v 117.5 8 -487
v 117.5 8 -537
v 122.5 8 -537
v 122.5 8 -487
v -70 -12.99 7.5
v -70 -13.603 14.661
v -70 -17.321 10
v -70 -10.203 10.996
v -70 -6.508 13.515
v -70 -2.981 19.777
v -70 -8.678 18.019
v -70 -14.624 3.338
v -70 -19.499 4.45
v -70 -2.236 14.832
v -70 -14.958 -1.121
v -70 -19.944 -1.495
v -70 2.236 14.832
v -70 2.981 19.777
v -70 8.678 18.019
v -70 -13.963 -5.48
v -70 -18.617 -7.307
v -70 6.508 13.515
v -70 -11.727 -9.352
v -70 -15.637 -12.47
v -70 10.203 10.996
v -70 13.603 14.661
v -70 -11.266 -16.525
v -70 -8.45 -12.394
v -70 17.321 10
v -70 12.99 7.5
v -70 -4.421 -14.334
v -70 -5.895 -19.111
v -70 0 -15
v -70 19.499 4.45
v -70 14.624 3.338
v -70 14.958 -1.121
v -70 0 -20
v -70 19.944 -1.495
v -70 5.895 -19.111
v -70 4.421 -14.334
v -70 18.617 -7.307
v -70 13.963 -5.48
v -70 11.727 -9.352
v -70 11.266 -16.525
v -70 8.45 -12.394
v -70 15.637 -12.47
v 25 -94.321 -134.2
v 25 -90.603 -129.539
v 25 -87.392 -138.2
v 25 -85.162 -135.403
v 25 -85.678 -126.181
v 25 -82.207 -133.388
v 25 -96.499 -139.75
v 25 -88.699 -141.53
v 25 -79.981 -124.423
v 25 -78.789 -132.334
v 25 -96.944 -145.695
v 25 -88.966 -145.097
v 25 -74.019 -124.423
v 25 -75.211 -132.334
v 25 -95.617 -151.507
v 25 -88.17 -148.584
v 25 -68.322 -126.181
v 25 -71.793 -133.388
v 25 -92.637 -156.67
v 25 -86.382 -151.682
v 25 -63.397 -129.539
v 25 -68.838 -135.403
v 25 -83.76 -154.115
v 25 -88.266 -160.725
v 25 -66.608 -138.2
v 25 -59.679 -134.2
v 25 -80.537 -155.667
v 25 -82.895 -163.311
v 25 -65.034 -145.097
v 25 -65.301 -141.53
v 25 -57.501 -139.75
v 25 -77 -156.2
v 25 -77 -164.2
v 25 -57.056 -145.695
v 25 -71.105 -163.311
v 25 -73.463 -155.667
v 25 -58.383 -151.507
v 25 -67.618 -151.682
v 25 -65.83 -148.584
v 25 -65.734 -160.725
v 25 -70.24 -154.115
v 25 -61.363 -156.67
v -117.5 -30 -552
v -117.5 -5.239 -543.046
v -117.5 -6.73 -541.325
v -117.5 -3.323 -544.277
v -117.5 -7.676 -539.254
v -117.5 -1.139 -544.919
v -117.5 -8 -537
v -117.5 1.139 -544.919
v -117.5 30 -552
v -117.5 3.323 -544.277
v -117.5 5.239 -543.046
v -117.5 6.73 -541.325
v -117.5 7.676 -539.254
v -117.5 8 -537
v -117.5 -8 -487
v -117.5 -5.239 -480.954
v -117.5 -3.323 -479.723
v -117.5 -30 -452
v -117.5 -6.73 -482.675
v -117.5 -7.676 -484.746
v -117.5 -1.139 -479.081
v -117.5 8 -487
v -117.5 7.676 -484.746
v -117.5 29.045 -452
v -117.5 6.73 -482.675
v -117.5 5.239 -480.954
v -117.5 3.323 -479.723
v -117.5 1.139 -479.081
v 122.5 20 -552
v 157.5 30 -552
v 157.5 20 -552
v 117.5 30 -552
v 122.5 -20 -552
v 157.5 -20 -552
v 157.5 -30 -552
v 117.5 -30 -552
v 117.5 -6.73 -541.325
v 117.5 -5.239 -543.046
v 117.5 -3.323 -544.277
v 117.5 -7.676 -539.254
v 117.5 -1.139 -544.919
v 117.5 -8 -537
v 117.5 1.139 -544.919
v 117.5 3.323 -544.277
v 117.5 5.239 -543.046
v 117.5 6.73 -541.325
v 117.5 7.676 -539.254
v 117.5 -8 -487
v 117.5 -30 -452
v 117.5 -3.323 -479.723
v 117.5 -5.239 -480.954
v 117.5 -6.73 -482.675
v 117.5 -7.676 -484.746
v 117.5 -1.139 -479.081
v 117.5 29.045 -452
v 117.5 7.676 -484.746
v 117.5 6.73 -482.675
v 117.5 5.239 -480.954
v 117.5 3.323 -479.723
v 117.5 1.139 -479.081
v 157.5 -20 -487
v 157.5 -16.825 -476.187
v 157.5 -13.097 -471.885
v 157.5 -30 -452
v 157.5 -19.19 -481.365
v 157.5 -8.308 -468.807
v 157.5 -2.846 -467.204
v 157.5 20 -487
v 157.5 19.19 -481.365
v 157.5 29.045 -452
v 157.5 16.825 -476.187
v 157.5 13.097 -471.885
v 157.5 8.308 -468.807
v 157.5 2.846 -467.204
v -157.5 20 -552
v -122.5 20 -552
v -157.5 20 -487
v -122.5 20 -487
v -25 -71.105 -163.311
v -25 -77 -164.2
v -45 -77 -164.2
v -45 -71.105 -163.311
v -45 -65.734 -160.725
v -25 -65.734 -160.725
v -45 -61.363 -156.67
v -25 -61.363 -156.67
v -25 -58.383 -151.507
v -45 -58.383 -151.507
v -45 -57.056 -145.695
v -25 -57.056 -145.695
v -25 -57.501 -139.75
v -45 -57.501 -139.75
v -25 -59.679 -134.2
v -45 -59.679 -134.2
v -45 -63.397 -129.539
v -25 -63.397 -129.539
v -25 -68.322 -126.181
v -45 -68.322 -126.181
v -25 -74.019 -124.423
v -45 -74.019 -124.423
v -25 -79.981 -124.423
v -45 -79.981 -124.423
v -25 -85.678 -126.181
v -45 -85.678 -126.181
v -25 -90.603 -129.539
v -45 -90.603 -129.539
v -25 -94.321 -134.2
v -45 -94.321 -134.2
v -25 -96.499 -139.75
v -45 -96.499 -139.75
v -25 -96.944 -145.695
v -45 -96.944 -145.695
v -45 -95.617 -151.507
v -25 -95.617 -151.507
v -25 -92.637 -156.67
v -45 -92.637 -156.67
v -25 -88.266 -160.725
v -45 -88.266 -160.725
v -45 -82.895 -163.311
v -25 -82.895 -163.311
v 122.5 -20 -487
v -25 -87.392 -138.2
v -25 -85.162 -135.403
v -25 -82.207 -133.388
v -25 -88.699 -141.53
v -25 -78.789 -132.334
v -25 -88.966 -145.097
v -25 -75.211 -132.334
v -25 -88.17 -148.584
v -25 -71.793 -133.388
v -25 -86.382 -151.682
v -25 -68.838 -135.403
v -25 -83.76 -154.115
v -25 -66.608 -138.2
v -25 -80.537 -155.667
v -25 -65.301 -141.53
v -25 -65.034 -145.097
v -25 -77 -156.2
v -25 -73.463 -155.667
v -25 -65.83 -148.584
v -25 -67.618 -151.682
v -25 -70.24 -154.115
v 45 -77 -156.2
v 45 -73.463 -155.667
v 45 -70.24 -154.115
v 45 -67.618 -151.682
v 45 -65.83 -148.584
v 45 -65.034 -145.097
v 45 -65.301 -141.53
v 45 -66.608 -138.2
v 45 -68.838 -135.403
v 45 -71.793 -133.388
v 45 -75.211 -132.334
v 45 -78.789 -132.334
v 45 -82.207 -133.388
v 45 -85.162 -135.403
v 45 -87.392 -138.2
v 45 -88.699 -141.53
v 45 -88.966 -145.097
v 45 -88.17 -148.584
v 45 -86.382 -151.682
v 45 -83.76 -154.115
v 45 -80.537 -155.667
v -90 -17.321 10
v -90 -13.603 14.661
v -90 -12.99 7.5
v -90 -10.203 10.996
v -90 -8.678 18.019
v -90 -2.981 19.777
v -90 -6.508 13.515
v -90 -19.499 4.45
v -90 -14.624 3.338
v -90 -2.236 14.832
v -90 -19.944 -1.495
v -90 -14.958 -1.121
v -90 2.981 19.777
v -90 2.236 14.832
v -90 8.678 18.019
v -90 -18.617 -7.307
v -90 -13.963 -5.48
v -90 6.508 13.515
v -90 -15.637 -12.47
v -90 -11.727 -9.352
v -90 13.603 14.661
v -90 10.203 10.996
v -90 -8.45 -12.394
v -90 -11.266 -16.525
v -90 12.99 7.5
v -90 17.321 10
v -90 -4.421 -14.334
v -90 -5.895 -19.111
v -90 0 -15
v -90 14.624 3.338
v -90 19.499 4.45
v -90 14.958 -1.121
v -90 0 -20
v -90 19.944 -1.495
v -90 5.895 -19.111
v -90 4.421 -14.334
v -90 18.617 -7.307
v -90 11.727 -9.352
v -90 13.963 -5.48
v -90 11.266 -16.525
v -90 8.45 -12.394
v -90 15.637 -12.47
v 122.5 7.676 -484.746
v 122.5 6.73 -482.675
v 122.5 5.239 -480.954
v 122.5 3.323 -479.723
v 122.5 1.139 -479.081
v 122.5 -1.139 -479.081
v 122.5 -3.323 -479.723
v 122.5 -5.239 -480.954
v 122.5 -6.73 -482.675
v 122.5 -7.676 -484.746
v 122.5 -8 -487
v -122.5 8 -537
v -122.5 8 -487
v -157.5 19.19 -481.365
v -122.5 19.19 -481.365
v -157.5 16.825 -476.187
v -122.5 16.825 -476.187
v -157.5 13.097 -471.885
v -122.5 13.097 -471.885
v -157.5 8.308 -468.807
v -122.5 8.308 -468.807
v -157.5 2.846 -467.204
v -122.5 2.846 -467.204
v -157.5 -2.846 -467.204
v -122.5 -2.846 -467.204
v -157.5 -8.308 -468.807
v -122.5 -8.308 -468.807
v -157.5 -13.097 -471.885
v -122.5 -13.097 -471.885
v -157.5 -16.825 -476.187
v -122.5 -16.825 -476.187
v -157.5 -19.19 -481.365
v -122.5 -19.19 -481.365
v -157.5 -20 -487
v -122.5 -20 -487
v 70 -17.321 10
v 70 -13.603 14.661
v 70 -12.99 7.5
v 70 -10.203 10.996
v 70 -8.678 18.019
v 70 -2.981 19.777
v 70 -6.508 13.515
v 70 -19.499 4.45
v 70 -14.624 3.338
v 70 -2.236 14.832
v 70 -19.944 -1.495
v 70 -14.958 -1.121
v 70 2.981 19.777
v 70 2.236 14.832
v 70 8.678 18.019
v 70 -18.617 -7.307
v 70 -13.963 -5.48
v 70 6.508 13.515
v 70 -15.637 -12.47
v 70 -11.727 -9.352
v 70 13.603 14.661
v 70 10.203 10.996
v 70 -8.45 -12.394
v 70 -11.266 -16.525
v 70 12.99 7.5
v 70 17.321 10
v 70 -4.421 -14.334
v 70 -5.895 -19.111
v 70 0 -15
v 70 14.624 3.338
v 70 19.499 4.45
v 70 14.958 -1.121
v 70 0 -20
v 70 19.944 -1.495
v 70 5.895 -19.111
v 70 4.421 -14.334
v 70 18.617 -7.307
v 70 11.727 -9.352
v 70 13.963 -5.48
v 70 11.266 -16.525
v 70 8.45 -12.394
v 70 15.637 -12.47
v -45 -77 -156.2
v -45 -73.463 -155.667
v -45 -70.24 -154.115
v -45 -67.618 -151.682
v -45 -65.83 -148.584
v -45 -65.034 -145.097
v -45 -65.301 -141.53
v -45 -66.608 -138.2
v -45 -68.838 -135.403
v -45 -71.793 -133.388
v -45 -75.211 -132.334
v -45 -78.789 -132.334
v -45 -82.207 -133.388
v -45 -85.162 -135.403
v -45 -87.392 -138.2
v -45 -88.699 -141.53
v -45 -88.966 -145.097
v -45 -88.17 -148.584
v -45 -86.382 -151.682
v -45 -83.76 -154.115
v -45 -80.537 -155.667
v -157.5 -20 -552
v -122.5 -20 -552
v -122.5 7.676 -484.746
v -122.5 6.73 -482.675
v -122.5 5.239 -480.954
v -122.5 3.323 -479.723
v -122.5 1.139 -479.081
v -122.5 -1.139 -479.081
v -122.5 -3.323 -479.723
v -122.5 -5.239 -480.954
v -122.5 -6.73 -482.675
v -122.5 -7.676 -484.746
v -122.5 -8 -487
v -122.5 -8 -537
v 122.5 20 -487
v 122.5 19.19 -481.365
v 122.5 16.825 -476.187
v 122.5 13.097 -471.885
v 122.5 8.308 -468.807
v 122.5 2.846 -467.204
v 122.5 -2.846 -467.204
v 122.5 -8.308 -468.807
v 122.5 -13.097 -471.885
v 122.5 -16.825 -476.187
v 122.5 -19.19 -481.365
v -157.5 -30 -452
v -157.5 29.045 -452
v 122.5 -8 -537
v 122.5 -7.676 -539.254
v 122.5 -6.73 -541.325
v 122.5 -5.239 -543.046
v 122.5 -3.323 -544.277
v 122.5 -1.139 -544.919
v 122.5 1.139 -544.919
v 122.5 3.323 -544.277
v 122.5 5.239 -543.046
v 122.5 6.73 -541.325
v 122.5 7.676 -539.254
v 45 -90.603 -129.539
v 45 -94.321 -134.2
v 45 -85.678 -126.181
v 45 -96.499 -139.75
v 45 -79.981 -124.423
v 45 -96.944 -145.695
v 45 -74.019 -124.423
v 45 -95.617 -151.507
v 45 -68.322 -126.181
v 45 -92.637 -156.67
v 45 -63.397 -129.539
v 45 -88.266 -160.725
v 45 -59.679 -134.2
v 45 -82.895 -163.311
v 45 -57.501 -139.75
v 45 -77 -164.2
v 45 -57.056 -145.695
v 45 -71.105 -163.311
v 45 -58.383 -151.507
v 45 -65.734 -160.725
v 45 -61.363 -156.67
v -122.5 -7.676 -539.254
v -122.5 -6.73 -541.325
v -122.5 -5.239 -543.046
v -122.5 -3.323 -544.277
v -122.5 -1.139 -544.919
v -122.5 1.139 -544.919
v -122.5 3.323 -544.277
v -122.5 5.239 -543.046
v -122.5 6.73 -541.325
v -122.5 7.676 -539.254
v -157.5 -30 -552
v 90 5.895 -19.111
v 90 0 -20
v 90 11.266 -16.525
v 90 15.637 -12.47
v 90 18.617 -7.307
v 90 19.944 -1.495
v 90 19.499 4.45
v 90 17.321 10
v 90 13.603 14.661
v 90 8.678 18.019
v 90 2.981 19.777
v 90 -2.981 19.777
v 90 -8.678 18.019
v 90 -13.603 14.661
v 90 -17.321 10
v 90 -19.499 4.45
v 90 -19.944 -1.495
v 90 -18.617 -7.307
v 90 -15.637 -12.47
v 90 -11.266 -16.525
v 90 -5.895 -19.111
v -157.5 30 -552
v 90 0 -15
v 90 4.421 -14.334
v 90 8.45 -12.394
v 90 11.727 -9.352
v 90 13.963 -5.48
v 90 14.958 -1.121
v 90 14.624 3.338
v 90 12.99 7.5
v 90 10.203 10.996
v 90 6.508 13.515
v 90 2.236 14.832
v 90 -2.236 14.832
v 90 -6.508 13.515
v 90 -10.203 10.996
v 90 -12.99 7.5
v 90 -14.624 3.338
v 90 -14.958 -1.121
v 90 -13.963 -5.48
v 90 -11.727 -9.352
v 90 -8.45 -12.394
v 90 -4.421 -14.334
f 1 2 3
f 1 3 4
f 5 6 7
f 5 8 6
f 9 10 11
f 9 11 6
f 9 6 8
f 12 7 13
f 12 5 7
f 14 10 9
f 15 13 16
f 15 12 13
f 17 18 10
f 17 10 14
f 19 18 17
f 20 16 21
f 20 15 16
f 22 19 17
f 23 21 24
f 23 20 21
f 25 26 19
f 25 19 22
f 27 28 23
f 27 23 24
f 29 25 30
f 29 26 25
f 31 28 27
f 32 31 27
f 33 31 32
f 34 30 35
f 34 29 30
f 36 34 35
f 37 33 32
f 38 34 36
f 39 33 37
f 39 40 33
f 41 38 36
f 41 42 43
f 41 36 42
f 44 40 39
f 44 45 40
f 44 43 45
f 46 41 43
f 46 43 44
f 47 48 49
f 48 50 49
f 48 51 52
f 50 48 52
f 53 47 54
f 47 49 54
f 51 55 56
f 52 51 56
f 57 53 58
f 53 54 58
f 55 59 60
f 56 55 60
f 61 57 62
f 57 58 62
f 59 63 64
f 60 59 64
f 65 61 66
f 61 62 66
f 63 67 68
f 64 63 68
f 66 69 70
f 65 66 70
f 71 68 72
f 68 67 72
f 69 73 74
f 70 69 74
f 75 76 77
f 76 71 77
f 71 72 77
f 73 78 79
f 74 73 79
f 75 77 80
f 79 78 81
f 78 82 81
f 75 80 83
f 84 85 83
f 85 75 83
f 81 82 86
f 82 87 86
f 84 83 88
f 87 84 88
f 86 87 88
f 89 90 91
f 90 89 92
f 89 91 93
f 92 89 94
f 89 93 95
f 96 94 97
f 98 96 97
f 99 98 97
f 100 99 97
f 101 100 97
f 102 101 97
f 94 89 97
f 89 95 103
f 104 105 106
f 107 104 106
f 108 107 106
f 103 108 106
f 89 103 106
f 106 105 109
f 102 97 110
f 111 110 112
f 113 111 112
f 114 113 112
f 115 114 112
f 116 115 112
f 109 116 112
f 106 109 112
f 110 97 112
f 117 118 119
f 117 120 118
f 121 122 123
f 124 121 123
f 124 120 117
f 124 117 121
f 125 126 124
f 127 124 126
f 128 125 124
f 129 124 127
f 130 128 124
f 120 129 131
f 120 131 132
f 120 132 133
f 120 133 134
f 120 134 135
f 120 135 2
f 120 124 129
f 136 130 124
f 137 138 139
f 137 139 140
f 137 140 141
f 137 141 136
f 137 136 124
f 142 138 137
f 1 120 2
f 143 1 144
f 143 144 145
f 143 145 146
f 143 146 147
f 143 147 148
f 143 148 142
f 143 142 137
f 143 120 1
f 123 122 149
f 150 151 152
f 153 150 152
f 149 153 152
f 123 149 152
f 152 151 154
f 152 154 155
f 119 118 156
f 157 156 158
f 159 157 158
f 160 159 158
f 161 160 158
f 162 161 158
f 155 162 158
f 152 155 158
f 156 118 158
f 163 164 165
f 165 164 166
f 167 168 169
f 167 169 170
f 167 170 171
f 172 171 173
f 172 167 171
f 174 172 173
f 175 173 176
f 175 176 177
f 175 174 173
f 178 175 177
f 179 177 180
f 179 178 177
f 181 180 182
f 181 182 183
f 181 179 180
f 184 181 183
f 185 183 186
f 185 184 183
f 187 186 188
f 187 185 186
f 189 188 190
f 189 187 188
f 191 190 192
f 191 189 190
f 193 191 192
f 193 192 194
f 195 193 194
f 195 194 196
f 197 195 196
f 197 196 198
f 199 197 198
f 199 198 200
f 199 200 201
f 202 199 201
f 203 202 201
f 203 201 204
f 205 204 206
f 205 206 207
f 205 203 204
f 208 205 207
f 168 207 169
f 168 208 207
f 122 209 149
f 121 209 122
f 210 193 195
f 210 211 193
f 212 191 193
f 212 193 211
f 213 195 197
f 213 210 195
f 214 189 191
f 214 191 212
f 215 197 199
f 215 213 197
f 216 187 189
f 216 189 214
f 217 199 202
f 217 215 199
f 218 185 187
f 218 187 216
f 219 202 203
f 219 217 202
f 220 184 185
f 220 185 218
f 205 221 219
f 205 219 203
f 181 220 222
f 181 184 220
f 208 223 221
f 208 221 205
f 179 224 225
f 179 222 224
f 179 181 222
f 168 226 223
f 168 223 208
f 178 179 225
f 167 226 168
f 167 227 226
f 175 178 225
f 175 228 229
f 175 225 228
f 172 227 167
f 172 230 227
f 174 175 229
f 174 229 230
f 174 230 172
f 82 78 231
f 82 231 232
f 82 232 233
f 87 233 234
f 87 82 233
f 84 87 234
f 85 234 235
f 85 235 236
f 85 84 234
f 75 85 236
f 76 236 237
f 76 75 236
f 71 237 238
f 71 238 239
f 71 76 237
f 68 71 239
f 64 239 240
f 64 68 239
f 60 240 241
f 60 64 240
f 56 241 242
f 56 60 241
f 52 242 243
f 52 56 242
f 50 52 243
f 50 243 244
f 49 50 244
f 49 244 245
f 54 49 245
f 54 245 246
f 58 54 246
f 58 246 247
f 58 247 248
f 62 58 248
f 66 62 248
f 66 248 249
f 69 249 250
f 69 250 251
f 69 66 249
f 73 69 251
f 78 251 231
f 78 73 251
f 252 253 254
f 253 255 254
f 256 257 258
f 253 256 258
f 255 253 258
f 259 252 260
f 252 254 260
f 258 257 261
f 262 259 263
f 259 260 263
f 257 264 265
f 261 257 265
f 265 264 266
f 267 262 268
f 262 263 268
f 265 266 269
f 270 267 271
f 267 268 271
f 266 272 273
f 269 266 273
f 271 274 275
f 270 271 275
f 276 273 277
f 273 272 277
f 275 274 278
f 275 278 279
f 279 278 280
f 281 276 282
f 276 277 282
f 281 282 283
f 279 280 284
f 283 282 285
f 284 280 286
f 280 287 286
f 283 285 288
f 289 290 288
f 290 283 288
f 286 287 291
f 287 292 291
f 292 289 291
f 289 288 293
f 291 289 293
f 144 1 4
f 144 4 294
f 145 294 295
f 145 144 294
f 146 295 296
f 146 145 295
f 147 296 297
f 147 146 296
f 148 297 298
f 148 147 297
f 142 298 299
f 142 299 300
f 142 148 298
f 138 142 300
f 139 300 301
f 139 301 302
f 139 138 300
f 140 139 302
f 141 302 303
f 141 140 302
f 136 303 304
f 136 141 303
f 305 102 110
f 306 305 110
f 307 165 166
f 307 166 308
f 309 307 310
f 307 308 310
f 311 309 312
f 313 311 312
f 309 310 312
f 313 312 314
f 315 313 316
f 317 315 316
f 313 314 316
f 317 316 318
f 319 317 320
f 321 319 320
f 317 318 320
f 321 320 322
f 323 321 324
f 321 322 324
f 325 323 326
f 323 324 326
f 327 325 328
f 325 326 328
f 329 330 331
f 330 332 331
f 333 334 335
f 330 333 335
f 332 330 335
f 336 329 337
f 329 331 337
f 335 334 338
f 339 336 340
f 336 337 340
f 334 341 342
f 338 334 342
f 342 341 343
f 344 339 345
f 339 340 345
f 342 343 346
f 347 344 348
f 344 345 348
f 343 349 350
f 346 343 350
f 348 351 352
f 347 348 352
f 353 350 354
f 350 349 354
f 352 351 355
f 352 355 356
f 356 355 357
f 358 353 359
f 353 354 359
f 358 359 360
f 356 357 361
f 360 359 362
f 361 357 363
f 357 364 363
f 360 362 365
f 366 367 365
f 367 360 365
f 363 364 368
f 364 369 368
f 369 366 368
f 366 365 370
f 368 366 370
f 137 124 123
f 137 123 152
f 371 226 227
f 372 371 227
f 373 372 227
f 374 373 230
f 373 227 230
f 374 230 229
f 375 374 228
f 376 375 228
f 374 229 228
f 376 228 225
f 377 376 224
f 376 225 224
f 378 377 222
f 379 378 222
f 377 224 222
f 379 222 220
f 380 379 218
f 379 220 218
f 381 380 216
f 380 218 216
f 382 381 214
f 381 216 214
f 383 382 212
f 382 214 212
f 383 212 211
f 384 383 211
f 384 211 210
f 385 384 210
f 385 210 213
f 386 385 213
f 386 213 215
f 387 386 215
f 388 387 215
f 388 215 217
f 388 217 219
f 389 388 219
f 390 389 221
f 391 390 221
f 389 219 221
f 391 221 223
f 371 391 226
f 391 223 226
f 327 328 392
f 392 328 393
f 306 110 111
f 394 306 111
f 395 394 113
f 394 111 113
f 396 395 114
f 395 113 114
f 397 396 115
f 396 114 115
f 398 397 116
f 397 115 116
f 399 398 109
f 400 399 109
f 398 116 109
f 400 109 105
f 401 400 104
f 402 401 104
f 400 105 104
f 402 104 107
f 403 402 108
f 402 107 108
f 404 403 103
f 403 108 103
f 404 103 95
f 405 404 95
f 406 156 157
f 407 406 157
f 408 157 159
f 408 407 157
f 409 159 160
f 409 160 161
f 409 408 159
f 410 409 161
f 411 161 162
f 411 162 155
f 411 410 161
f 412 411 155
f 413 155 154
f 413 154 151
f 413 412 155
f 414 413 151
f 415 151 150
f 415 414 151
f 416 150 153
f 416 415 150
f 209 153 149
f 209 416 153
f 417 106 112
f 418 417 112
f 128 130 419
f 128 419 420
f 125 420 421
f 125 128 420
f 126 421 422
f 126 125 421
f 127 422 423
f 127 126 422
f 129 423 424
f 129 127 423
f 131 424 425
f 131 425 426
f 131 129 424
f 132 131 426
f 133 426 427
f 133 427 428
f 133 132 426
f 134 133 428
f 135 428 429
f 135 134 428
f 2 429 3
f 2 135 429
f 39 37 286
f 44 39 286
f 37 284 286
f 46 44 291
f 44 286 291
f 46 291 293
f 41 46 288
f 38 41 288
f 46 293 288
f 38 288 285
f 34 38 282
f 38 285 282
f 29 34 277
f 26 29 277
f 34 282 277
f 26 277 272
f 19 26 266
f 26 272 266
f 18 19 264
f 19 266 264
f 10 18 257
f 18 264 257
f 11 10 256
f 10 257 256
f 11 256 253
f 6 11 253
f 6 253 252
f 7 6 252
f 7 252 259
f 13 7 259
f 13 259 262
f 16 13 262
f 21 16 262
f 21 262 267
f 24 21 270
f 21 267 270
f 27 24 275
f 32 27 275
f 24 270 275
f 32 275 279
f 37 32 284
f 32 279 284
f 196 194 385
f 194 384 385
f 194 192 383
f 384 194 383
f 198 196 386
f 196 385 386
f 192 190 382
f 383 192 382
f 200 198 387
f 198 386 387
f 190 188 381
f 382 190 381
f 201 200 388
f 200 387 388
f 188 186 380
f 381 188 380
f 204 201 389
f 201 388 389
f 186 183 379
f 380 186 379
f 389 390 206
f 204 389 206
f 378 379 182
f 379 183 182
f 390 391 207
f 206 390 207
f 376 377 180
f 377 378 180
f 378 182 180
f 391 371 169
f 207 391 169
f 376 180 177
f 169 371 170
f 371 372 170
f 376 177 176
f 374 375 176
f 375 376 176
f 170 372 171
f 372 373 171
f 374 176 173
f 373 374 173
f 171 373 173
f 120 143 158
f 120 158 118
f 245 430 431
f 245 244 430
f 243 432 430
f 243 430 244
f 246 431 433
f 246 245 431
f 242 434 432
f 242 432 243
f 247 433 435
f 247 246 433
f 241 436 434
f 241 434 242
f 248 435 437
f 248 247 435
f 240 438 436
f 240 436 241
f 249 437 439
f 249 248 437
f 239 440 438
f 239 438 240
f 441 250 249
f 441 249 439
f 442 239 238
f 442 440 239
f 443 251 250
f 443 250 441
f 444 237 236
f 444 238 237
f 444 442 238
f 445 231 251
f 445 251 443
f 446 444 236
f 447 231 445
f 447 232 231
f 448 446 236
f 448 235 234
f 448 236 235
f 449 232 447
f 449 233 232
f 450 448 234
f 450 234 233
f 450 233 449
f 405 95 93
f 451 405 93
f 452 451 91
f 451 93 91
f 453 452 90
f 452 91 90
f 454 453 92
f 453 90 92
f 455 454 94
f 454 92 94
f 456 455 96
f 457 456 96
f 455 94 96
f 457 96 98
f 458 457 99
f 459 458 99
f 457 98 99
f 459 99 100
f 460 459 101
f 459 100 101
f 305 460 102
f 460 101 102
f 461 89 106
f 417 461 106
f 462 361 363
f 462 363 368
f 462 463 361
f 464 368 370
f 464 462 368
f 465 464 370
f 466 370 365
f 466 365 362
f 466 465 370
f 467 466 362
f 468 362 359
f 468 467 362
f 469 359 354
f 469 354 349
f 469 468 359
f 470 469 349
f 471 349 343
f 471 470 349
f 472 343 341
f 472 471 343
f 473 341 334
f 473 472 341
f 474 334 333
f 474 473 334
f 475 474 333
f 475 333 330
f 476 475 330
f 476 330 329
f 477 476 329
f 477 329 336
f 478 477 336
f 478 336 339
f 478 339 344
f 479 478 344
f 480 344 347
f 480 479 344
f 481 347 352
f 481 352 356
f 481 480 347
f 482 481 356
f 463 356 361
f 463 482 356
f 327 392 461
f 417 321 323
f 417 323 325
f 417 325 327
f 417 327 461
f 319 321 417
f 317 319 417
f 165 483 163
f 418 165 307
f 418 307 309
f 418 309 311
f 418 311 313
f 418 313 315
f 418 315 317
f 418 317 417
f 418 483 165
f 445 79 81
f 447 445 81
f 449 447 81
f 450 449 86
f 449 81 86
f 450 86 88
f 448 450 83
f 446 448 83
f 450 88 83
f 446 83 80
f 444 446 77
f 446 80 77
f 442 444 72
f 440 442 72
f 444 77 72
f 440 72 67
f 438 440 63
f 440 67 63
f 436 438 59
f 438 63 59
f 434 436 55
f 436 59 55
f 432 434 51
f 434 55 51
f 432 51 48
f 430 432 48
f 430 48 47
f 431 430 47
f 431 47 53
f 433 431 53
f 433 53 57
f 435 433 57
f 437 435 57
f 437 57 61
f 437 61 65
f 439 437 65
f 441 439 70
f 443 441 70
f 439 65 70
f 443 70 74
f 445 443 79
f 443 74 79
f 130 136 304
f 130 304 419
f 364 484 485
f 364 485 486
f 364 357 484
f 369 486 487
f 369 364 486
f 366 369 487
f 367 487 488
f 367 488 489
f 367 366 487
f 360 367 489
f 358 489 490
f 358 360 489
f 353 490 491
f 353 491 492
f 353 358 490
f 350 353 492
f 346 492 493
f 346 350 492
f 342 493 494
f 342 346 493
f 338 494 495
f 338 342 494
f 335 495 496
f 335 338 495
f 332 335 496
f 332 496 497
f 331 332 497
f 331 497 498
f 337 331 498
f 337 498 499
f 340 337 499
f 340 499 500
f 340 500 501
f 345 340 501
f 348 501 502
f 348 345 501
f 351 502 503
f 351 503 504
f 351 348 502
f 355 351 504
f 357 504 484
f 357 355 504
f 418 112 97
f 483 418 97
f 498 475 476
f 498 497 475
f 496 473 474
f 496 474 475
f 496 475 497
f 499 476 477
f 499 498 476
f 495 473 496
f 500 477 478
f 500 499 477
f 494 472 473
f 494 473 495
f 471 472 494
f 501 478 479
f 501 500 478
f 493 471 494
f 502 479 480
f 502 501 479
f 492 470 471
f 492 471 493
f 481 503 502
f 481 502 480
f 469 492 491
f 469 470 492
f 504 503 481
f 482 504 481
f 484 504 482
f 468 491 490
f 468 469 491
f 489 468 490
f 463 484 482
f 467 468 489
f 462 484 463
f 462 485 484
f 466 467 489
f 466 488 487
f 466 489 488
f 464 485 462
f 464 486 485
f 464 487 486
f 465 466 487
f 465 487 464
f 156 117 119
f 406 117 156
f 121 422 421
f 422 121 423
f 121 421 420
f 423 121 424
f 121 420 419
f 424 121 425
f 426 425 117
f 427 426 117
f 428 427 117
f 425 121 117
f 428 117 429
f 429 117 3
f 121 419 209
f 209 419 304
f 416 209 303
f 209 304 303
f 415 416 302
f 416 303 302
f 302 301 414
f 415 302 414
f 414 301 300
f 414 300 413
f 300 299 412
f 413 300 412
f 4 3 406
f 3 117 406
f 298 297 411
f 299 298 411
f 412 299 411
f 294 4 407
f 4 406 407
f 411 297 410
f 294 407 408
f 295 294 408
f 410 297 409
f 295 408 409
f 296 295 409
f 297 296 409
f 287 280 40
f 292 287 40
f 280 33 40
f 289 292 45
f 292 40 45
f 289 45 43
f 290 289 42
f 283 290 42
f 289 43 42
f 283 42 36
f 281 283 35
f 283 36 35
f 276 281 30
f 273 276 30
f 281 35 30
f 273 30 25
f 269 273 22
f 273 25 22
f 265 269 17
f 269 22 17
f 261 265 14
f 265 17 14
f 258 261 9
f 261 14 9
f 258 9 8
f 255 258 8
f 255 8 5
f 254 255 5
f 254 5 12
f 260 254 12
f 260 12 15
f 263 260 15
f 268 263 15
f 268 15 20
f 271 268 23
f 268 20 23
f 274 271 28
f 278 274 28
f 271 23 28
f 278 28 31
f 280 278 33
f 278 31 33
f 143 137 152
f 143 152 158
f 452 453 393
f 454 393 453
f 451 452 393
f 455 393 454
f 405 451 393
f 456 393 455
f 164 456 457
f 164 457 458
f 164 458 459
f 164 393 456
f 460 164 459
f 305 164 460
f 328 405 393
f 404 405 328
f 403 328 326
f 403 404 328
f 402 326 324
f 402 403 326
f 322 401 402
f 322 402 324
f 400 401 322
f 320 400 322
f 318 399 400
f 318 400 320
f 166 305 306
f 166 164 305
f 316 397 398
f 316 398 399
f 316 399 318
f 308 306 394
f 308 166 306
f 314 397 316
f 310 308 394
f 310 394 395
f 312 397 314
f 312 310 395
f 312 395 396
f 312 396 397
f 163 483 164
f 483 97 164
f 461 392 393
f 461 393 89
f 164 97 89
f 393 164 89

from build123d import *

# Parameters (mm, degrees)
TYLNE_START              = -7.5
TYLNE_KO_O_DEPTH         = 5
TYLENE_START             = -2.5
TYLENE_KO_O_2_DEPTH      = 35
RAMA_START               = -55
SZKIC_INSERT_RAMA_R      = 20
SZKIC_INSERT_RAMA_R_2    = 15
RAMA_DEPTH               = 10
LINKAGE_START            = 25
SZKIC_INSERT_LINKAGE_R   = 20
SZKIC_INSERT_LINKAGE_R_2 = 12
LINKAGE_DEPTH            = 20


with BuildPart() as part:
    # Szkic - insert - tylne koło → Tylne koło (new body)
    with BuildSketch(Plane(origin=(125, 0, 0), x_dir=(0, 0, -1), z_dir=(1, 0, 0)).offset(TYLNE_START)):
        with BuildLine():
            ThreePointArc((487, 20), (467, 0), (487, -20))
            Line((487, -20), (552, -20))
            Line((552, -20), (552, -30))
            Line((552, -30), (452, -30))
            Line((452, -30), (452, 29.044549731))
            Line((452, 29.044549731), (552, 30))
            Line((552, 30), (552, 20))
            Line((552, 20), (487, 20))
        make_face()
        with BuildLine():
            Line((487, 20), (552, 20))
            Line((552, 20), (552, -20))
            Line((552, -20), (487, -20))
            ThreePointArc((487, -20), (467, 0), (487, 20))
        make_face()
        with BuildLine():
            ThreePointArc((537, -8), (545, 0), (537, 8))
            Line((537, 8), (487, 8))
            ThreePointArc((487, 8), (479, 0), (487, -8))
            Line((487, -8), (537, -8))
        make_face(mode=Mode.SUBTRACT)
    extrude(amount=TYLNE_KO_O_DEPTH)

    # Szkic - insert - tylne koło<6> → Tylene koło 2 (add)
    with BuildSketch(Plane(origin=(125, 0, 0), x_dir=(0, 0, -1), z_dir=(1, 0, 0)).offset(TYLENE_START)):
        with BuildLine():
            ThreePointArc((487, 20), (467, 0), (487, -20))
            Line((487, -20), (552, -20))
            Line((552, -20), (552, -30))
            Line((552, -30), (452, -30))
            Line((452, -30), (452, 29.044549731))
            Line((452, 29.044549731), (552, 30))
            Line((552, 30), (552, 20))
            Line((552, 20), (487, 20))
        make_face()
    extrude(amount=TYLENE_KO_O_2_DEPTH)


with BuildPart() as body_2:
    # Szkic - insert - rama → Rama (new, symmetric)
    with BuildSketch(Plane(origin=(135, 0, 0), x_dir=(0, 0, -1), z_dir=(1, 0, 0)).offset(RAMA_START)):
        Circle(SZKIC_INSERT_RAMA_R)
        Circle(SZKIC_INSERT_RAMA_R_2, mode=Mode.SUBTRACT)
    extrude(amount=RAMA_DEPTH, both=True)


with BuildPart() as body_3:
    # Szkic - insert - linkage → Linkage (new body)
    with BuildSketch(Plane(origin=(0, 0, 0), x_dir=(0, 0, -1), z_dir=(1, 0, 0)).offset(LINKAGE_START)):
        with Locations((144.2, -77)):
            Circle(SZKIC_INSERT_LINKAGE_R)
        with Locations((144.2, -77)):
            Circle(SZKIC_INSERT_LINKAGE_R_2, mode=Mode.SUBTRACT)
    extrude(amount=LINKAGE_DEPTH)


with BuildPart() as body_4:
    # Lustro1: mirrored copy
    add(part.part.mirror(Plane(origin=(0, 0, 0), x_dir=(0, 0, 1), z_dir=(1, 0, 0))))


with BuildPart() as body_5:
    # Lustro1 2: mirrored copy
    add(body_2.part.mirror(Plane(origin=(0, 0, 0), x_dir=(0, 0, 1), z_dir=(1, 0, 0))))


with BuildPart() as body_6:
    # Lustro1 3: mirrored copy
    add(body_3.part.mirror(Plane(origin=(0, 0, 0), x_dir=(0, 0, 1), z_dir=(1, 0, 0))))


solid = Compound([part.part, body_2.part, body_3.part, body_4.part, body_5.part, body_6.part])
